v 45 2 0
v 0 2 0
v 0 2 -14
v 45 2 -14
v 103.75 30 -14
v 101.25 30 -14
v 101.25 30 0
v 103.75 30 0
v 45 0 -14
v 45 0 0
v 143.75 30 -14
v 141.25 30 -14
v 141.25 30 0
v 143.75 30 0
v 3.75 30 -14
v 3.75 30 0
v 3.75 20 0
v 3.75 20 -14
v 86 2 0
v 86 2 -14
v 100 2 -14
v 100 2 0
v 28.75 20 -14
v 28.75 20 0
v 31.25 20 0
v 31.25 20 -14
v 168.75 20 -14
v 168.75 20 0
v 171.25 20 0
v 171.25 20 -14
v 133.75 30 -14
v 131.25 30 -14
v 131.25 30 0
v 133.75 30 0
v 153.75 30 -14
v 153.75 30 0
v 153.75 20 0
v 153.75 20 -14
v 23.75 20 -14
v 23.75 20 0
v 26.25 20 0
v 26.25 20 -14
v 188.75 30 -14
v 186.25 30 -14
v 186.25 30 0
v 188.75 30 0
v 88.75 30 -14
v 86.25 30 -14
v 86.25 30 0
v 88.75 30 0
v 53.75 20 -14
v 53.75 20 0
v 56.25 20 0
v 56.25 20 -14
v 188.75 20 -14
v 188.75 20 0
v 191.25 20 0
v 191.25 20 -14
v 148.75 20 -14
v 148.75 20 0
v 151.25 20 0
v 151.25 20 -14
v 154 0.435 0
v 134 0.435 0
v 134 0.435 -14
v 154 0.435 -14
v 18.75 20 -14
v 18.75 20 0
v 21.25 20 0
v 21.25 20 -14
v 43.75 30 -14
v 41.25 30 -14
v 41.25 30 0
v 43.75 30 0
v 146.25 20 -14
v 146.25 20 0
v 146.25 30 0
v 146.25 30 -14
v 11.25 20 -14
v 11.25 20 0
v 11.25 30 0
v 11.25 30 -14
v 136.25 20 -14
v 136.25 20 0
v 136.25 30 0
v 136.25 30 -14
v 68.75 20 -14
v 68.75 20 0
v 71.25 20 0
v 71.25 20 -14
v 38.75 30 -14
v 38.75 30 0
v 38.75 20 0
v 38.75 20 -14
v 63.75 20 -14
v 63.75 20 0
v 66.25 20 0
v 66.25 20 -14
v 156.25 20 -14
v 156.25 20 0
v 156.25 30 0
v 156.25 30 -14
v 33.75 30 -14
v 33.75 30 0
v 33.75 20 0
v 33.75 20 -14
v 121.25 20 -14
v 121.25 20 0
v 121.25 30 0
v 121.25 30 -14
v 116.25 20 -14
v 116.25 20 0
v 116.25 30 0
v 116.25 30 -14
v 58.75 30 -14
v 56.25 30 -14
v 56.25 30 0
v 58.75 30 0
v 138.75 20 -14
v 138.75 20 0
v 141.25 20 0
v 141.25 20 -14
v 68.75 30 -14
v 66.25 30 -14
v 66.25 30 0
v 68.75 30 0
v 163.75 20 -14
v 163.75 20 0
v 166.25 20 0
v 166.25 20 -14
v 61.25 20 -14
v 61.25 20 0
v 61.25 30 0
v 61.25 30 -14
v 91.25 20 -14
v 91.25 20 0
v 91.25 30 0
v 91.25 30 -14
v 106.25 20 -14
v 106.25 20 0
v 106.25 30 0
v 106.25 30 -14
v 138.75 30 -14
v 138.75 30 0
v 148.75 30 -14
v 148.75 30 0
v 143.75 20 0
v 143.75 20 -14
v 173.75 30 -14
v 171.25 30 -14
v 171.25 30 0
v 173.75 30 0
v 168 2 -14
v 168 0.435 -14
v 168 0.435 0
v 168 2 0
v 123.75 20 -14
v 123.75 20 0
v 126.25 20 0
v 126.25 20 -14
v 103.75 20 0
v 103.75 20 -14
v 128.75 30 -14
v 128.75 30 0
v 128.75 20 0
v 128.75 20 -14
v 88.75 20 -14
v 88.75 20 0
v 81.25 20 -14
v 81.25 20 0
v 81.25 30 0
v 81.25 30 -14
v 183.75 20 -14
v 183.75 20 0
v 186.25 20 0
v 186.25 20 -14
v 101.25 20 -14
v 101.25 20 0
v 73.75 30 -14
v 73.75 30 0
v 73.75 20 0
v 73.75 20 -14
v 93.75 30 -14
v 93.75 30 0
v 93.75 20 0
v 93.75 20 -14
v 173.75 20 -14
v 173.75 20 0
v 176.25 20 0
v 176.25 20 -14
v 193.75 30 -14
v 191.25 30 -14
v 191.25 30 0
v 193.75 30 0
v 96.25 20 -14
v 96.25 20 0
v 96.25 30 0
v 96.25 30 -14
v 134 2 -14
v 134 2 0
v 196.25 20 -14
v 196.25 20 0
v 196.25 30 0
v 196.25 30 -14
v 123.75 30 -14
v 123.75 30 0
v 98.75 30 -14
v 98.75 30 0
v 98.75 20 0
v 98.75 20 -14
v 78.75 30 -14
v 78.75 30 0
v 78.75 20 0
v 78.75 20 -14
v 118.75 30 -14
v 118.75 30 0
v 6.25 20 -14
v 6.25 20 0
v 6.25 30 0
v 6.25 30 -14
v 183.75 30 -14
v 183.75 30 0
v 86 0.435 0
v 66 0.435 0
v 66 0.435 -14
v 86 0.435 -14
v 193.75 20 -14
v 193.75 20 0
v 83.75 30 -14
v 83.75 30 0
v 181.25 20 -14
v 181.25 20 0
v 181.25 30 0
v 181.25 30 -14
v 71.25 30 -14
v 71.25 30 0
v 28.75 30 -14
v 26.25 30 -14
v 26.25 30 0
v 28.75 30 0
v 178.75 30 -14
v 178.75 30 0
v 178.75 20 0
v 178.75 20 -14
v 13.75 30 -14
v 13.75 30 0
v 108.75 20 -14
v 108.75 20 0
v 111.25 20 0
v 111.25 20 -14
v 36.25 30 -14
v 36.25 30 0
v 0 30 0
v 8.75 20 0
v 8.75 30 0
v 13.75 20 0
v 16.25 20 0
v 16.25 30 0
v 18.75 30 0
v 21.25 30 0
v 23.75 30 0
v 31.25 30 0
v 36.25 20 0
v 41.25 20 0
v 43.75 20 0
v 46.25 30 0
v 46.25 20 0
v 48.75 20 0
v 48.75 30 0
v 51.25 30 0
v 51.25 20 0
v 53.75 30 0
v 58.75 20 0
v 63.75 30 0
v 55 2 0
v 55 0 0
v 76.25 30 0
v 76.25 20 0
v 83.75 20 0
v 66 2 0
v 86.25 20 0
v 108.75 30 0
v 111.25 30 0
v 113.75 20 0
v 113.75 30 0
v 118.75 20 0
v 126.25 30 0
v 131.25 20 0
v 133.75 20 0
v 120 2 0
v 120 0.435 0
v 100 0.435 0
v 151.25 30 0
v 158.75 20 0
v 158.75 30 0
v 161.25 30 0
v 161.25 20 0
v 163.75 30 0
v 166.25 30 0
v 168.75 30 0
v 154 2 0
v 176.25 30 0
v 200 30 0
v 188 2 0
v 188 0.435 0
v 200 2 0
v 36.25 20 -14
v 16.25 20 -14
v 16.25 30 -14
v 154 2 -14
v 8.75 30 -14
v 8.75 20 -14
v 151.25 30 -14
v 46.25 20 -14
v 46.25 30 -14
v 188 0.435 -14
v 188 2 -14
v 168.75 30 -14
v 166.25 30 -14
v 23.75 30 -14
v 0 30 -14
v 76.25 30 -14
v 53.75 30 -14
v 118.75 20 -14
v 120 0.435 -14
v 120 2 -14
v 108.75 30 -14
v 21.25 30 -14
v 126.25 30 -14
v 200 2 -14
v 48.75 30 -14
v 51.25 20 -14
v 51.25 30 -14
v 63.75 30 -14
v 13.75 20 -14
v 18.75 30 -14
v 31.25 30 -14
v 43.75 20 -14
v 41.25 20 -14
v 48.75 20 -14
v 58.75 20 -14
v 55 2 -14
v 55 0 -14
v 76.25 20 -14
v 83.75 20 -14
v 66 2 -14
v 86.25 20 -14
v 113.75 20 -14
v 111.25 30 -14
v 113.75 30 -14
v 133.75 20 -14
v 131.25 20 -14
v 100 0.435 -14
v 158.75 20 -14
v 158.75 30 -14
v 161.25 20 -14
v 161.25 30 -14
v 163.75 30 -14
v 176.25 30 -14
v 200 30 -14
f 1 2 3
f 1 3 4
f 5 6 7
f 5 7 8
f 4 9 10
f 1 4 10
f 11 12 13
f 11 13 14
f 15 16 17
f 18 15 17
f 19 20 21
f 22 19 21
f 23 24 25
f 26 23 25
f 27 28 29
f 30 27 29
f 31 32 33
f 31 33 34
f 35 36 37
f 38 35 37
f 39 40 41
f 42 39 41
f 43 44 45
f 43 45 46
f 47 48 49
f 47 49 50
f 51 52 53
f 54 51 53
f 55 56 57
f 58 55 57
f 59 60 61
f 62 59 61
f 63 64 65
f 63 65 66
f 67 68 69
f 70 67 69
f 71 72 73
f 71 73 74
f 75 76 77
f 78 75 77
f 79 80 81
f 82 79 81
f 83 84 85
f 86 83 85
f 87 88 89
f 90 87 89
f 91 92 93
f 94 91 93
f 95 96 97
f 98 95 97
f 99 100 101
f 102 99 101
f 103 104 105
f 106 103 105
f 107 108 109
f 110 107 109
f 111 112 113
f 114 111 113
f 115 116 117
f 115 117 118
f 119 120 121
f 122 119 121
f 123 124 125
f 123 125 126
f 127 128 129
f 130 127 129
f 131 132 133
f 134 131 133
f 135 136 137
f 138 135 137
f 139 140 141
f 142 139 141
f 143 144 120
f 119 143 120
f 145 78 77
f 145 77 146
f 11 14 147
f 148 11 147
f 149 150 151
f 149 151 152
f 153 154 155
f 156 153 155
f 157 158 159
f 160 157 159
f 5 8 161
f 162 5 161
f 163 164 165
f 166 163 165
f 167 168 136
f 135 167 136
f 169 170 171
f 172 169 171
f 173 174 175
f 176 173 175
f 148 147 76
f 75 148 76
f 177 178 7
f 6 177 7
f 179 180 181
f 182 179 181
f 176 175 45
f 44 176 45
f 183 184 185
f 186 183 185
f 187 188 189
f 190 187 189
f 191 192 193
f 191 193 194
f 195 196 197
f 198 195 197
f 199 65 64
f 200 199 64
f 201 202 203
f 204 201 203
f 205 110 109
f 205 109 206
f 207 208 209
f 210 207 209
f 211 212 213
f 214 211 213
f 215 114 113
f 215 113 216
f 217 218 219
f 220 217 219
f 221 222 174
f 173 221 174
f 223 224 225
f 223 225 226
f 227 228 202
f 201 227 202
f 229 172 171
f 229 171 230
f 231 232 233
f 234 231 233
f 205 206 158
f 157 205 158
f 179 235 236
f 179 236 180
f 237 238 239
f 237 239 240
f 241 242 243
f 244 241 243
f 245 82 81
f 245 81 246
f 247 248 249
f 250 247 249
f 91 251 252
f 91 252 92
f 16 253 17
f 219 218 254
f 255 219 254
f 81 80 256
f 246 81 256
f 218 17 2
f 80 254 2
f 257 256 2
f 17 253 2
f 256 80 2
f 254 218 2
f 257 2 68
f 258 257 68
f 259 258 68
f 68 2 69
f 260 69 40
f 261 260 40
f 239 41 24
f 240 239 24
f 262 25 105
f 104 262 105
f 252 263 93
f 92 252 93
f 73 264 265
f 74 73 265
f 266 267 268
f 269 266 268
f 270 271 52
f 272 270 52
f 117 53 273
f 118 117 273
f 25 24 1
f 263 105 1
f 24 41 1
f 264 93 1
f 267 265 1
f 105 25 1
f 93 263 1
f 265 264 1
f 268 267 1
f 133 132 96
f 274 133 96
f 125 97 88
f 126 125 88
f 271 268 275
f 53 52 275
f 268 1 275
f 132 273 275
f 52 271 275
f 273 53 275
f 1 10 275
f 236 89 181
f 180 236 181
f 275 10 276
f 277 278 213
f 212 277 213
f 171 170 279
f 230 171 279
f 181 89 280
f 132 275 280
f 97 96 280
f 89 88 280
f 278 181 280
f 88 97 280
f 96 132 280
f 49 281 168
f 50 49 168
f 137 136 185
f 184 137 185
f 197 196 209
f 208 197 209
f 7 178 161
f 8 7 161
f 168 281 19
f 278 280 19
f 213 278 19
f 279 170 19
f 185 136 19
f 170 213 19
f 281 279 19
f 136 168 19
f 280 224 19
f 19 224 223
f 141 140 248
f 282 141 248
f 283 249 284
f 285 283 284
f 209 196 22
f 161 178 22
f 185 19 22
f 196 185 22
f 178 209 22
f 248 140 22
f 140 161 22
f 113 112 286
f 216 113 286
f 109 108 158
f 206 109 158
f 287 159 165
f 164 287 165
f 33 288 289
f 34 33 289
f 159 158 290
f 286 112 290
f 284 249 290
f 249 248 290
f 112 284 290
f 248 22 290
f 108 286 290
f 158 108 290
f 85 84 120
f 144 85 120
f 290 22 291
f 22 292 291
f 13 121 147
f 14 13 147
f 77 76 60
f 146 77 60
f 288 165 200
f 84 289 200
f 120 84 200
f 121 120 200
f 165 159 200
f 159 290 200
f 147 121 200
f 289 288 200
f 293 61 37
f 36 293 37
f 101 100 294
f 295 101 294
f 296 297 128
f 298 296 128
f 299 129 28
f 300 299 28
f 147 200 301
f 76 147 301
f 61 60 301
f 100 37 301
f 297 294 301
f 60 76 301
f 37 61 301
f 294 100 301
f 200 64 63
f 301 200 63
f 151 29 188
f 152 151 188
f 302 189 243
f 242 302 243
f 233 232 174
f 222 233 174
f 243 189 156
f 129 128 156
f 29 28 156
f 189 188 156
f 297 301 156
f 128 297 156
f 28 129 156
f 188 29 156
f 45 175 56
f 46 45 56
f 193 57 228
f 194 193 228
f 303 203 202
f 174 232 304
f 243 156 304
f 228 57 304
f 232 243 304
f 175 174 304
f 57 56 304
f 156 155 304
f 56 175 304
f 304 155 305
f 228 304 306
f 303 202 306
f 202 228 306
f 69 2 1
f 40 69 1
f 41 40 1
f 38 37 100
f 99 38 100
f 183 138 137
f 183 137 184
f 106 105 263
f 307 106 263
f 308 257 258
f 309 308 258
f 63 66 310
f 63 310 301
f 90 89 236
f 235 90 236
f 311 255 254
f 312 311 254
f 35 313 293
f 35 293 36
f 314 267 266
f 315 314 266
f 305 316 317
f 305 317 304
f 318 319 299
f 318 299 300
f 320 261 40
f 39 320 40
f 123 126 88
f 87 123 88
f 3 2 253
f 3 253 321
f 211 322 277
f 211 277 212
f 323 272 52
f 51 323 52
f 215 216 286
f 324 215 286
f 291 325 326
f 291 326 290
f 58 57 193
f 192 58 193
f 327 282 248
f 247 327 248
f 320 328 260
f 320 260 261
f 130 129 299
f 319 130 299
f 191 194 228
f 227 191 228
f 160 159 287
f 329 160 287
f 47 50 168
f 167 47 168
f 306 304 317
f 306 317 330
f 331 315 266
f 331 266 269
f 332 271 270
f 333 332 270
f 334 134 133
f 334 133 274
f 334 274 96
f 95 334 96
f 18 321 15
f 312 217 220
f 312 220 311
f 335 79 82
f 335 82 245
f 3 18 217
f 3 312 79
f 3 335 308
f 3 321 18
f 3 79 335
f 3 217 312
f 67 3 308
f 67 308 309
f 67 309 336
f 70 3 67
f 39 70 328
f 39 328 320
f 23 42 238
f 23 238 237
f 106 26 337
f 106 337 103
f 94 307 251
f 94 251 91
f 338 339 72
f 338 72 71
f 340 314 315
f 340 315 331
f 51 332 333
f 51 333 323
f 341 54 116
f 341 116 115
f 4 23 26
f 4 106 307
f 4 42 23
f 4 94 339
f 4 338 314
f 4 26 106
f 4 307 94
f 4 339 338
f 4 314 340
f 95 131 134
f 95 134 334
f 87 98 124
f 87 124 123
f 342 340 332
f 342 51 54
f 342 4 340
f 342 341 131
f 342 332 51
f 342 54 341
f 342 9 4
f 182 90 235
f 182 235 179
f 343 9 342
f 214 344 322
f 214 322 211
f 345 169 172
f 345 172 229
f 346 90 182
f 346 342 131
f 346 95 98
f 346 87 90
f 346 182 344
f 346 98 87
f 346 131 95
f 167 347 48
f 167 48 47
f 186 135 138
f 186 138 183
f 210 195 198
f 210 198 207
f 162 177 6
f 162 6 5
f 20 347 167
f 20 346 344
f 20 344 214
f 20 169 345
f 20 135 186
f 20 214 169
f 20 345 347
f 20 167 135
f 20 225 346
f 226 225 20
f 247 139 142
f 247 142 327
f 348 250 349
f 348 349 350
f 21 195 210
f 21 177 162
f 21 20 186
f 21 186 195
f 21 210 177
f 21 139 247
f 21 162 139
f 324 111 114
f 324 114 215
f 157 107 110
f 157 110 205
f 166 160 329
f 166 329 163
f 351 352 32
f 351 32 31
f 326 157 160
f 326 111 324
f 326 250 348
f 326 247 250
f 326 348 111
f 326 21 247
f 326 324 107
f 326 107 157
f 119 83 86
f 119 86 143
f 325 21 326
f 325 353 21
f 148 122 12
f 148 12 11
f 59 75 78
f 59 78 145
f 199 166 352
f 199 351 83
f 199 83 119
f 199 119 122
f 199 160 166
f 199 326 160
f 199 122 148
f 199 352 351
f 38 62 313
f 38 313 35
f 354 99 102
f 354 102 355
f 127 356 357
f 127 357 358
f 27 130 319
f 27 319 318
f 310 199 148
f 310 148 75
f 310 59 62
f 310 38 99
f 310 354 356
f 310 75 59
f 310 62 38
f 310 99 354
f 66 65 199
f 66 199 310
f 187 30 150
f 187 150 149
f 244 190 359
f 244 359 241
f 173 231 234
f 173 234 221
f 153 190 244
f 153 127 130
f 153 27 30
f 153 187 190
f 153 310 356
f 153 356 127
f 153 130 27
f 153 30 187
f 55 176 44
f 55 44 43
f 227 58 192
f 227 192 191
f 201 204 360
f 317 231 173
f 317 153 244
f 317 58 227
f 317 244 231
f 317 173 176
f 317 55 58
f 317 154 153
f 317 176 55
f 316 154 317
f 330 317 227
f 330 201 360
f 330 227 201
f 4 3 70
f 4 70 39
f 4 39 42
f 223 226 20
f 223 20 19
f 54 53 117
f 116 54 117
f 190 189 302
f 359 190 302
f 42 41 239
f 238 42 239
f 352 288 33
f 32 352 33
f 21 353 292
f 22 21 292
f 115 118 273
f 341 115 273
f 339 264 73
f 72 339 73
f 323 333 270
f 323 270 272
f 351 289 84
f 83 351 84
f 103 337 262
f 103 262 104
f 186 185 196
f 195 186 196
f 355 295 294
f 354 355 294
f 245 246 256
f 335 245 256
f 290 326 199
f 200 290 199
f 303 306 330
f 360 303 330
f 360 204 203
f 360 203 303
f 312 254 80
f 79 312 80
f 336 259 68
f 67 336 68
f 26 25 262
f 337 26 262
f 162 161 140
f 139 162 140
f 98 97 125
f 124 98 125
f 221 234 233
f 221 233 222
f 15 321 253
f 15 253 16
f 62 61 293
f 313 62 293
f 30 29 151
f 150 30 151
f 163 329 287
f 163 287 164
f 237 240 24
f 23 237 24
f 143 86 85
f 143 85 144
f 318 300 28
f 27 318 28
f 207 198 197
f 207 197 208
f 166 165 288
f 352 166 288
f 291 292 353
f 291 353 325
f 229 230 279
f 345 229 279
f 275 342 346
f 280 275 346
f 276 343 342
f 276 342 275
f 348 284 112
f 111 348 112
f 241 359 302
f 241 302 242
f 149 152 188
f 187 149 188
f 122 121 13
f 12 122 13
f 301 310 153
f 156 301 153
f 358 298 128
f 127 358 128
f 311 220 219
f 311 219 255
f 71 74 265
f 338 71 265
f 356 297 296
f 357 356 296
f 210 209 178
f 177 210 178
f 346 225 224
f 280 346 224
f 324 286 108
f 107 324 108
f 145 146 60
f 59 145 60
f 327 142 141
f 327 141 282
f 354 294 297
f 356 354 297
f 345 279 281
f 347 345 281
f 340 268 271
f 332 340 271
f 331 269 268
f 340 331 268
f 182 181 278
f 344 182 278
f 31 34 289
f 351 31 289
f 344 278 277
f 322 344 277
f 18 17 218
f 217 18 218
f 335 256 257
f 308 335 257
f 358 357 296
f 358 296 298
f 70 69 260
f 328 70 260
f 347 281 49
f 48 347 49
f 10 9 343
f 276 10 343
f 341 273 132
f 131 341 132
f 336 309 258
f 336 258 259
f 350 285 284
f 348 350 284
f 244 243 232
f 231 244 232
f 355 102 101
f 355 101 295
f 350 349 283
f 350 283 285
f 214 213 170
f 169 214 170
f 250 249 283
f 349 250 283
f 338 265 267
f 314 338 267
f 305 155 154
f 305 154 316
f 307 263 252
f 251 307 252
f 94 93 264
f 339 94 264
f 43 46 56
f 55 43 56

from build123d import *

# Parameters (mm, degrees)
SKETCH1_W           = 200
SKETCH1_H           = 14
BOSS_EXTRUDE1_DEPTH = 30
SKETCH2_W           = 12
SKETCH2_H           = 14
SKETCH2_W_2         = 14
SKETCH2_W_3         = 11
SKETCH2_W_4         = 45
CUT_EXTRUDE1_DEPTH  = 2
SKETCH3_W           = 20
SKETCH3_H           = 14
CUT_EXTRUDE2_DEPTH  = 0.435
CUT_EXTRUDE4_DEPTH  = 203.721483815


with BuildPart() as part:
    # Sketch1 → Boss-Extrude1 (new body)
    with BuildSketch(Plane(origin=(0, 0, 0), x_dir=(1, 0, 0), z_dir=(0, 1, 0))):
        with Locations((100, 7)):
            Rectangle(SKETCH1_W, SKETCH1_H)
    extrude(amount=BOSS_EXTRUDE1_DEPTH)

    # Sketch2 → Cut-Extrude1 (cut)
    with BuildSketch(Plane.XZ):
        with Locations((194, -7)):
            Rectangle(SKETCH2_W, SKETCH2_H)
        with Locations((161, -7)):
            Rectangle(SKETCH2_W_2, SKETCH2_H)
        with Locations((127, -7)):
            Rectangle(SKETCH2_W_2, SKETCH2_H)
        with Locations((93, -7)):
            Rectangle(SKETCH2_W_2, SKETCH2_H)
        with Locations((60.5, -7)):
            Rectangle(SKETCH2_W_3, SKETCH2_H)
        with Locations((22.5, -7)):
            Rectangle(SKETCH2_W_4, SKETCH2_H)
    extrude(amount=-CUT_EXTRUDE1_DEPTH, mode=Mode.SUBTRACT)

    # Sketch3 → Cut-Extrude2 (cut)
    with BuildSketch(Plane.XZ):
        with Locations((76, -7)):
            Rectangle(SKETCH3_W, SKETCH3_H)
        with Locations((110, -7)):
            Rectangle(SKETCH3_W, SKETCH3_H)
        with Locations((144, -7)):
            Rectangle(SKETCH3_W, SKETCH3_H)
        with Locations((178, -7)):
            Rectangle(SKETCH3_W, SKETCH3_H)
    extrude(amount=-CUT_EXTRUDE2_DEPTH, mode=Mode.SUBTRACT)

    # Sketch5 → Cut-Extrude4 (cut, through all)
    with BuildSketch(Plane.XY):
        Polygon((3.75, 30), (3.75, 20), (6.25, 20), (6.25, 30), (8.75, 30), (8.75, 20), (11.25, 20), (11.25, 30), (13.75, 30), (13.75, 20), (16.25, 20), (16.25, 30), (18.75, 30), (18.75, 20), (21.25, 20), (21.25, 30), (23.75, 30), (23.75, 20), (26.25, 20), (26.25, 30), (28.75, 30), (28.75, 20), (31.25, 20), (31.25, 30), (33.75, 30), (33.75, 20), (36.25, 20), (36.25, 30), (38.75, 30), (38.75, 20), (41.25, 20), (41.25, 30), (43.75, 30), (43.75, 20), (46.25, 20), (46.25, 30), (48.75, 30), (48.75, 20), (51.25, 20), (51.25, 30), (53.75, 30), (53.75, 20), (56.25, 20), (56.25, 30), (58.75, 30), (58.75, 20), (61.25, 20), (61.25, 30), (63.75, 30), (63.75, 20), (66.25, 20), (66.25, 30), (68.75, 30), (68.75, 20), (71.25, 20), (71.25, 30), (73.75, 30), (73.75, 20), (76.25, 20), (76.25, 30), (78.75, 30), (78.75, 20), (81.25, 20), (81.25, 30), (83.75, 30), (83.75, 20), (86.25, 20), (86.25, 30), (88.75, 30), (88.75, 20), (91.25, 20), (91.25, 30), (93.75, 30), (93.75, 20), (96.25, 20), (96.25, 30), (98.75, 30), (98.75, 20), (101.25, 20), (101.25, 30), (103.75, 30), (103.75, 20), (106.25, 20), (106.25, 30), (108.75, 30), (108.75, 20), (111.25, 20), (111.25, 30), (113.75, 30), (113.75, 20), (116.25, 20), (116.25, 30), (118.75, 30), (118.75, 20), (121.25, 20), (121.25, 30), (123.75, 30), (123.75, 20), (126.25, 20), (126.25, 30), (128.75, 30), (128.75, 20), (131.25, 20), (131.25, 30), (133.75, 30), (133.75, 20), (136.25, 20), (136.25, 30), (138.75, 30), (138.75, 20), (141.25, 20), (141.25, 30), (143.75, 30), (143.75, 20), (146.25, 20), (146.25, 30), (148.75, 30), (148.75, 20), (151.25, 20), (151.25, 30), (153.75, 30), (153.75, 20), (156.25, 20), (156.25, 30), (158.75, 30), (158.75, 20), (161.25, 20), (161.25, 30), (163.75, 30), (163.75, 20), (166.25, 20), (166.25, 30), (168.75, 30), (168.75, 20), (171.25, 20), (171.25, 30), (173.75, 30), (173.75, 20), (176.25, 20), (176.25, 30), (178.75, 30), (178.75, 20), (181.25, 20), (181.25, 30), (183.75, 30), (183.75, 20), (186.25, 20), (186.25, 30), (188.75, 30), (188.75, 20), (191.25, 20), (191.25, 30), (193.75, 30), (193.75, 20), (196.25, 20), (196.25, 30), (196.25, 37.451923055), (3.75, 37.451923055), align=None)
    extrude(amount=-CUT_EXTRUDE4_DEPTH, mode=Mode.SUBTRACT)


solid = part.part
